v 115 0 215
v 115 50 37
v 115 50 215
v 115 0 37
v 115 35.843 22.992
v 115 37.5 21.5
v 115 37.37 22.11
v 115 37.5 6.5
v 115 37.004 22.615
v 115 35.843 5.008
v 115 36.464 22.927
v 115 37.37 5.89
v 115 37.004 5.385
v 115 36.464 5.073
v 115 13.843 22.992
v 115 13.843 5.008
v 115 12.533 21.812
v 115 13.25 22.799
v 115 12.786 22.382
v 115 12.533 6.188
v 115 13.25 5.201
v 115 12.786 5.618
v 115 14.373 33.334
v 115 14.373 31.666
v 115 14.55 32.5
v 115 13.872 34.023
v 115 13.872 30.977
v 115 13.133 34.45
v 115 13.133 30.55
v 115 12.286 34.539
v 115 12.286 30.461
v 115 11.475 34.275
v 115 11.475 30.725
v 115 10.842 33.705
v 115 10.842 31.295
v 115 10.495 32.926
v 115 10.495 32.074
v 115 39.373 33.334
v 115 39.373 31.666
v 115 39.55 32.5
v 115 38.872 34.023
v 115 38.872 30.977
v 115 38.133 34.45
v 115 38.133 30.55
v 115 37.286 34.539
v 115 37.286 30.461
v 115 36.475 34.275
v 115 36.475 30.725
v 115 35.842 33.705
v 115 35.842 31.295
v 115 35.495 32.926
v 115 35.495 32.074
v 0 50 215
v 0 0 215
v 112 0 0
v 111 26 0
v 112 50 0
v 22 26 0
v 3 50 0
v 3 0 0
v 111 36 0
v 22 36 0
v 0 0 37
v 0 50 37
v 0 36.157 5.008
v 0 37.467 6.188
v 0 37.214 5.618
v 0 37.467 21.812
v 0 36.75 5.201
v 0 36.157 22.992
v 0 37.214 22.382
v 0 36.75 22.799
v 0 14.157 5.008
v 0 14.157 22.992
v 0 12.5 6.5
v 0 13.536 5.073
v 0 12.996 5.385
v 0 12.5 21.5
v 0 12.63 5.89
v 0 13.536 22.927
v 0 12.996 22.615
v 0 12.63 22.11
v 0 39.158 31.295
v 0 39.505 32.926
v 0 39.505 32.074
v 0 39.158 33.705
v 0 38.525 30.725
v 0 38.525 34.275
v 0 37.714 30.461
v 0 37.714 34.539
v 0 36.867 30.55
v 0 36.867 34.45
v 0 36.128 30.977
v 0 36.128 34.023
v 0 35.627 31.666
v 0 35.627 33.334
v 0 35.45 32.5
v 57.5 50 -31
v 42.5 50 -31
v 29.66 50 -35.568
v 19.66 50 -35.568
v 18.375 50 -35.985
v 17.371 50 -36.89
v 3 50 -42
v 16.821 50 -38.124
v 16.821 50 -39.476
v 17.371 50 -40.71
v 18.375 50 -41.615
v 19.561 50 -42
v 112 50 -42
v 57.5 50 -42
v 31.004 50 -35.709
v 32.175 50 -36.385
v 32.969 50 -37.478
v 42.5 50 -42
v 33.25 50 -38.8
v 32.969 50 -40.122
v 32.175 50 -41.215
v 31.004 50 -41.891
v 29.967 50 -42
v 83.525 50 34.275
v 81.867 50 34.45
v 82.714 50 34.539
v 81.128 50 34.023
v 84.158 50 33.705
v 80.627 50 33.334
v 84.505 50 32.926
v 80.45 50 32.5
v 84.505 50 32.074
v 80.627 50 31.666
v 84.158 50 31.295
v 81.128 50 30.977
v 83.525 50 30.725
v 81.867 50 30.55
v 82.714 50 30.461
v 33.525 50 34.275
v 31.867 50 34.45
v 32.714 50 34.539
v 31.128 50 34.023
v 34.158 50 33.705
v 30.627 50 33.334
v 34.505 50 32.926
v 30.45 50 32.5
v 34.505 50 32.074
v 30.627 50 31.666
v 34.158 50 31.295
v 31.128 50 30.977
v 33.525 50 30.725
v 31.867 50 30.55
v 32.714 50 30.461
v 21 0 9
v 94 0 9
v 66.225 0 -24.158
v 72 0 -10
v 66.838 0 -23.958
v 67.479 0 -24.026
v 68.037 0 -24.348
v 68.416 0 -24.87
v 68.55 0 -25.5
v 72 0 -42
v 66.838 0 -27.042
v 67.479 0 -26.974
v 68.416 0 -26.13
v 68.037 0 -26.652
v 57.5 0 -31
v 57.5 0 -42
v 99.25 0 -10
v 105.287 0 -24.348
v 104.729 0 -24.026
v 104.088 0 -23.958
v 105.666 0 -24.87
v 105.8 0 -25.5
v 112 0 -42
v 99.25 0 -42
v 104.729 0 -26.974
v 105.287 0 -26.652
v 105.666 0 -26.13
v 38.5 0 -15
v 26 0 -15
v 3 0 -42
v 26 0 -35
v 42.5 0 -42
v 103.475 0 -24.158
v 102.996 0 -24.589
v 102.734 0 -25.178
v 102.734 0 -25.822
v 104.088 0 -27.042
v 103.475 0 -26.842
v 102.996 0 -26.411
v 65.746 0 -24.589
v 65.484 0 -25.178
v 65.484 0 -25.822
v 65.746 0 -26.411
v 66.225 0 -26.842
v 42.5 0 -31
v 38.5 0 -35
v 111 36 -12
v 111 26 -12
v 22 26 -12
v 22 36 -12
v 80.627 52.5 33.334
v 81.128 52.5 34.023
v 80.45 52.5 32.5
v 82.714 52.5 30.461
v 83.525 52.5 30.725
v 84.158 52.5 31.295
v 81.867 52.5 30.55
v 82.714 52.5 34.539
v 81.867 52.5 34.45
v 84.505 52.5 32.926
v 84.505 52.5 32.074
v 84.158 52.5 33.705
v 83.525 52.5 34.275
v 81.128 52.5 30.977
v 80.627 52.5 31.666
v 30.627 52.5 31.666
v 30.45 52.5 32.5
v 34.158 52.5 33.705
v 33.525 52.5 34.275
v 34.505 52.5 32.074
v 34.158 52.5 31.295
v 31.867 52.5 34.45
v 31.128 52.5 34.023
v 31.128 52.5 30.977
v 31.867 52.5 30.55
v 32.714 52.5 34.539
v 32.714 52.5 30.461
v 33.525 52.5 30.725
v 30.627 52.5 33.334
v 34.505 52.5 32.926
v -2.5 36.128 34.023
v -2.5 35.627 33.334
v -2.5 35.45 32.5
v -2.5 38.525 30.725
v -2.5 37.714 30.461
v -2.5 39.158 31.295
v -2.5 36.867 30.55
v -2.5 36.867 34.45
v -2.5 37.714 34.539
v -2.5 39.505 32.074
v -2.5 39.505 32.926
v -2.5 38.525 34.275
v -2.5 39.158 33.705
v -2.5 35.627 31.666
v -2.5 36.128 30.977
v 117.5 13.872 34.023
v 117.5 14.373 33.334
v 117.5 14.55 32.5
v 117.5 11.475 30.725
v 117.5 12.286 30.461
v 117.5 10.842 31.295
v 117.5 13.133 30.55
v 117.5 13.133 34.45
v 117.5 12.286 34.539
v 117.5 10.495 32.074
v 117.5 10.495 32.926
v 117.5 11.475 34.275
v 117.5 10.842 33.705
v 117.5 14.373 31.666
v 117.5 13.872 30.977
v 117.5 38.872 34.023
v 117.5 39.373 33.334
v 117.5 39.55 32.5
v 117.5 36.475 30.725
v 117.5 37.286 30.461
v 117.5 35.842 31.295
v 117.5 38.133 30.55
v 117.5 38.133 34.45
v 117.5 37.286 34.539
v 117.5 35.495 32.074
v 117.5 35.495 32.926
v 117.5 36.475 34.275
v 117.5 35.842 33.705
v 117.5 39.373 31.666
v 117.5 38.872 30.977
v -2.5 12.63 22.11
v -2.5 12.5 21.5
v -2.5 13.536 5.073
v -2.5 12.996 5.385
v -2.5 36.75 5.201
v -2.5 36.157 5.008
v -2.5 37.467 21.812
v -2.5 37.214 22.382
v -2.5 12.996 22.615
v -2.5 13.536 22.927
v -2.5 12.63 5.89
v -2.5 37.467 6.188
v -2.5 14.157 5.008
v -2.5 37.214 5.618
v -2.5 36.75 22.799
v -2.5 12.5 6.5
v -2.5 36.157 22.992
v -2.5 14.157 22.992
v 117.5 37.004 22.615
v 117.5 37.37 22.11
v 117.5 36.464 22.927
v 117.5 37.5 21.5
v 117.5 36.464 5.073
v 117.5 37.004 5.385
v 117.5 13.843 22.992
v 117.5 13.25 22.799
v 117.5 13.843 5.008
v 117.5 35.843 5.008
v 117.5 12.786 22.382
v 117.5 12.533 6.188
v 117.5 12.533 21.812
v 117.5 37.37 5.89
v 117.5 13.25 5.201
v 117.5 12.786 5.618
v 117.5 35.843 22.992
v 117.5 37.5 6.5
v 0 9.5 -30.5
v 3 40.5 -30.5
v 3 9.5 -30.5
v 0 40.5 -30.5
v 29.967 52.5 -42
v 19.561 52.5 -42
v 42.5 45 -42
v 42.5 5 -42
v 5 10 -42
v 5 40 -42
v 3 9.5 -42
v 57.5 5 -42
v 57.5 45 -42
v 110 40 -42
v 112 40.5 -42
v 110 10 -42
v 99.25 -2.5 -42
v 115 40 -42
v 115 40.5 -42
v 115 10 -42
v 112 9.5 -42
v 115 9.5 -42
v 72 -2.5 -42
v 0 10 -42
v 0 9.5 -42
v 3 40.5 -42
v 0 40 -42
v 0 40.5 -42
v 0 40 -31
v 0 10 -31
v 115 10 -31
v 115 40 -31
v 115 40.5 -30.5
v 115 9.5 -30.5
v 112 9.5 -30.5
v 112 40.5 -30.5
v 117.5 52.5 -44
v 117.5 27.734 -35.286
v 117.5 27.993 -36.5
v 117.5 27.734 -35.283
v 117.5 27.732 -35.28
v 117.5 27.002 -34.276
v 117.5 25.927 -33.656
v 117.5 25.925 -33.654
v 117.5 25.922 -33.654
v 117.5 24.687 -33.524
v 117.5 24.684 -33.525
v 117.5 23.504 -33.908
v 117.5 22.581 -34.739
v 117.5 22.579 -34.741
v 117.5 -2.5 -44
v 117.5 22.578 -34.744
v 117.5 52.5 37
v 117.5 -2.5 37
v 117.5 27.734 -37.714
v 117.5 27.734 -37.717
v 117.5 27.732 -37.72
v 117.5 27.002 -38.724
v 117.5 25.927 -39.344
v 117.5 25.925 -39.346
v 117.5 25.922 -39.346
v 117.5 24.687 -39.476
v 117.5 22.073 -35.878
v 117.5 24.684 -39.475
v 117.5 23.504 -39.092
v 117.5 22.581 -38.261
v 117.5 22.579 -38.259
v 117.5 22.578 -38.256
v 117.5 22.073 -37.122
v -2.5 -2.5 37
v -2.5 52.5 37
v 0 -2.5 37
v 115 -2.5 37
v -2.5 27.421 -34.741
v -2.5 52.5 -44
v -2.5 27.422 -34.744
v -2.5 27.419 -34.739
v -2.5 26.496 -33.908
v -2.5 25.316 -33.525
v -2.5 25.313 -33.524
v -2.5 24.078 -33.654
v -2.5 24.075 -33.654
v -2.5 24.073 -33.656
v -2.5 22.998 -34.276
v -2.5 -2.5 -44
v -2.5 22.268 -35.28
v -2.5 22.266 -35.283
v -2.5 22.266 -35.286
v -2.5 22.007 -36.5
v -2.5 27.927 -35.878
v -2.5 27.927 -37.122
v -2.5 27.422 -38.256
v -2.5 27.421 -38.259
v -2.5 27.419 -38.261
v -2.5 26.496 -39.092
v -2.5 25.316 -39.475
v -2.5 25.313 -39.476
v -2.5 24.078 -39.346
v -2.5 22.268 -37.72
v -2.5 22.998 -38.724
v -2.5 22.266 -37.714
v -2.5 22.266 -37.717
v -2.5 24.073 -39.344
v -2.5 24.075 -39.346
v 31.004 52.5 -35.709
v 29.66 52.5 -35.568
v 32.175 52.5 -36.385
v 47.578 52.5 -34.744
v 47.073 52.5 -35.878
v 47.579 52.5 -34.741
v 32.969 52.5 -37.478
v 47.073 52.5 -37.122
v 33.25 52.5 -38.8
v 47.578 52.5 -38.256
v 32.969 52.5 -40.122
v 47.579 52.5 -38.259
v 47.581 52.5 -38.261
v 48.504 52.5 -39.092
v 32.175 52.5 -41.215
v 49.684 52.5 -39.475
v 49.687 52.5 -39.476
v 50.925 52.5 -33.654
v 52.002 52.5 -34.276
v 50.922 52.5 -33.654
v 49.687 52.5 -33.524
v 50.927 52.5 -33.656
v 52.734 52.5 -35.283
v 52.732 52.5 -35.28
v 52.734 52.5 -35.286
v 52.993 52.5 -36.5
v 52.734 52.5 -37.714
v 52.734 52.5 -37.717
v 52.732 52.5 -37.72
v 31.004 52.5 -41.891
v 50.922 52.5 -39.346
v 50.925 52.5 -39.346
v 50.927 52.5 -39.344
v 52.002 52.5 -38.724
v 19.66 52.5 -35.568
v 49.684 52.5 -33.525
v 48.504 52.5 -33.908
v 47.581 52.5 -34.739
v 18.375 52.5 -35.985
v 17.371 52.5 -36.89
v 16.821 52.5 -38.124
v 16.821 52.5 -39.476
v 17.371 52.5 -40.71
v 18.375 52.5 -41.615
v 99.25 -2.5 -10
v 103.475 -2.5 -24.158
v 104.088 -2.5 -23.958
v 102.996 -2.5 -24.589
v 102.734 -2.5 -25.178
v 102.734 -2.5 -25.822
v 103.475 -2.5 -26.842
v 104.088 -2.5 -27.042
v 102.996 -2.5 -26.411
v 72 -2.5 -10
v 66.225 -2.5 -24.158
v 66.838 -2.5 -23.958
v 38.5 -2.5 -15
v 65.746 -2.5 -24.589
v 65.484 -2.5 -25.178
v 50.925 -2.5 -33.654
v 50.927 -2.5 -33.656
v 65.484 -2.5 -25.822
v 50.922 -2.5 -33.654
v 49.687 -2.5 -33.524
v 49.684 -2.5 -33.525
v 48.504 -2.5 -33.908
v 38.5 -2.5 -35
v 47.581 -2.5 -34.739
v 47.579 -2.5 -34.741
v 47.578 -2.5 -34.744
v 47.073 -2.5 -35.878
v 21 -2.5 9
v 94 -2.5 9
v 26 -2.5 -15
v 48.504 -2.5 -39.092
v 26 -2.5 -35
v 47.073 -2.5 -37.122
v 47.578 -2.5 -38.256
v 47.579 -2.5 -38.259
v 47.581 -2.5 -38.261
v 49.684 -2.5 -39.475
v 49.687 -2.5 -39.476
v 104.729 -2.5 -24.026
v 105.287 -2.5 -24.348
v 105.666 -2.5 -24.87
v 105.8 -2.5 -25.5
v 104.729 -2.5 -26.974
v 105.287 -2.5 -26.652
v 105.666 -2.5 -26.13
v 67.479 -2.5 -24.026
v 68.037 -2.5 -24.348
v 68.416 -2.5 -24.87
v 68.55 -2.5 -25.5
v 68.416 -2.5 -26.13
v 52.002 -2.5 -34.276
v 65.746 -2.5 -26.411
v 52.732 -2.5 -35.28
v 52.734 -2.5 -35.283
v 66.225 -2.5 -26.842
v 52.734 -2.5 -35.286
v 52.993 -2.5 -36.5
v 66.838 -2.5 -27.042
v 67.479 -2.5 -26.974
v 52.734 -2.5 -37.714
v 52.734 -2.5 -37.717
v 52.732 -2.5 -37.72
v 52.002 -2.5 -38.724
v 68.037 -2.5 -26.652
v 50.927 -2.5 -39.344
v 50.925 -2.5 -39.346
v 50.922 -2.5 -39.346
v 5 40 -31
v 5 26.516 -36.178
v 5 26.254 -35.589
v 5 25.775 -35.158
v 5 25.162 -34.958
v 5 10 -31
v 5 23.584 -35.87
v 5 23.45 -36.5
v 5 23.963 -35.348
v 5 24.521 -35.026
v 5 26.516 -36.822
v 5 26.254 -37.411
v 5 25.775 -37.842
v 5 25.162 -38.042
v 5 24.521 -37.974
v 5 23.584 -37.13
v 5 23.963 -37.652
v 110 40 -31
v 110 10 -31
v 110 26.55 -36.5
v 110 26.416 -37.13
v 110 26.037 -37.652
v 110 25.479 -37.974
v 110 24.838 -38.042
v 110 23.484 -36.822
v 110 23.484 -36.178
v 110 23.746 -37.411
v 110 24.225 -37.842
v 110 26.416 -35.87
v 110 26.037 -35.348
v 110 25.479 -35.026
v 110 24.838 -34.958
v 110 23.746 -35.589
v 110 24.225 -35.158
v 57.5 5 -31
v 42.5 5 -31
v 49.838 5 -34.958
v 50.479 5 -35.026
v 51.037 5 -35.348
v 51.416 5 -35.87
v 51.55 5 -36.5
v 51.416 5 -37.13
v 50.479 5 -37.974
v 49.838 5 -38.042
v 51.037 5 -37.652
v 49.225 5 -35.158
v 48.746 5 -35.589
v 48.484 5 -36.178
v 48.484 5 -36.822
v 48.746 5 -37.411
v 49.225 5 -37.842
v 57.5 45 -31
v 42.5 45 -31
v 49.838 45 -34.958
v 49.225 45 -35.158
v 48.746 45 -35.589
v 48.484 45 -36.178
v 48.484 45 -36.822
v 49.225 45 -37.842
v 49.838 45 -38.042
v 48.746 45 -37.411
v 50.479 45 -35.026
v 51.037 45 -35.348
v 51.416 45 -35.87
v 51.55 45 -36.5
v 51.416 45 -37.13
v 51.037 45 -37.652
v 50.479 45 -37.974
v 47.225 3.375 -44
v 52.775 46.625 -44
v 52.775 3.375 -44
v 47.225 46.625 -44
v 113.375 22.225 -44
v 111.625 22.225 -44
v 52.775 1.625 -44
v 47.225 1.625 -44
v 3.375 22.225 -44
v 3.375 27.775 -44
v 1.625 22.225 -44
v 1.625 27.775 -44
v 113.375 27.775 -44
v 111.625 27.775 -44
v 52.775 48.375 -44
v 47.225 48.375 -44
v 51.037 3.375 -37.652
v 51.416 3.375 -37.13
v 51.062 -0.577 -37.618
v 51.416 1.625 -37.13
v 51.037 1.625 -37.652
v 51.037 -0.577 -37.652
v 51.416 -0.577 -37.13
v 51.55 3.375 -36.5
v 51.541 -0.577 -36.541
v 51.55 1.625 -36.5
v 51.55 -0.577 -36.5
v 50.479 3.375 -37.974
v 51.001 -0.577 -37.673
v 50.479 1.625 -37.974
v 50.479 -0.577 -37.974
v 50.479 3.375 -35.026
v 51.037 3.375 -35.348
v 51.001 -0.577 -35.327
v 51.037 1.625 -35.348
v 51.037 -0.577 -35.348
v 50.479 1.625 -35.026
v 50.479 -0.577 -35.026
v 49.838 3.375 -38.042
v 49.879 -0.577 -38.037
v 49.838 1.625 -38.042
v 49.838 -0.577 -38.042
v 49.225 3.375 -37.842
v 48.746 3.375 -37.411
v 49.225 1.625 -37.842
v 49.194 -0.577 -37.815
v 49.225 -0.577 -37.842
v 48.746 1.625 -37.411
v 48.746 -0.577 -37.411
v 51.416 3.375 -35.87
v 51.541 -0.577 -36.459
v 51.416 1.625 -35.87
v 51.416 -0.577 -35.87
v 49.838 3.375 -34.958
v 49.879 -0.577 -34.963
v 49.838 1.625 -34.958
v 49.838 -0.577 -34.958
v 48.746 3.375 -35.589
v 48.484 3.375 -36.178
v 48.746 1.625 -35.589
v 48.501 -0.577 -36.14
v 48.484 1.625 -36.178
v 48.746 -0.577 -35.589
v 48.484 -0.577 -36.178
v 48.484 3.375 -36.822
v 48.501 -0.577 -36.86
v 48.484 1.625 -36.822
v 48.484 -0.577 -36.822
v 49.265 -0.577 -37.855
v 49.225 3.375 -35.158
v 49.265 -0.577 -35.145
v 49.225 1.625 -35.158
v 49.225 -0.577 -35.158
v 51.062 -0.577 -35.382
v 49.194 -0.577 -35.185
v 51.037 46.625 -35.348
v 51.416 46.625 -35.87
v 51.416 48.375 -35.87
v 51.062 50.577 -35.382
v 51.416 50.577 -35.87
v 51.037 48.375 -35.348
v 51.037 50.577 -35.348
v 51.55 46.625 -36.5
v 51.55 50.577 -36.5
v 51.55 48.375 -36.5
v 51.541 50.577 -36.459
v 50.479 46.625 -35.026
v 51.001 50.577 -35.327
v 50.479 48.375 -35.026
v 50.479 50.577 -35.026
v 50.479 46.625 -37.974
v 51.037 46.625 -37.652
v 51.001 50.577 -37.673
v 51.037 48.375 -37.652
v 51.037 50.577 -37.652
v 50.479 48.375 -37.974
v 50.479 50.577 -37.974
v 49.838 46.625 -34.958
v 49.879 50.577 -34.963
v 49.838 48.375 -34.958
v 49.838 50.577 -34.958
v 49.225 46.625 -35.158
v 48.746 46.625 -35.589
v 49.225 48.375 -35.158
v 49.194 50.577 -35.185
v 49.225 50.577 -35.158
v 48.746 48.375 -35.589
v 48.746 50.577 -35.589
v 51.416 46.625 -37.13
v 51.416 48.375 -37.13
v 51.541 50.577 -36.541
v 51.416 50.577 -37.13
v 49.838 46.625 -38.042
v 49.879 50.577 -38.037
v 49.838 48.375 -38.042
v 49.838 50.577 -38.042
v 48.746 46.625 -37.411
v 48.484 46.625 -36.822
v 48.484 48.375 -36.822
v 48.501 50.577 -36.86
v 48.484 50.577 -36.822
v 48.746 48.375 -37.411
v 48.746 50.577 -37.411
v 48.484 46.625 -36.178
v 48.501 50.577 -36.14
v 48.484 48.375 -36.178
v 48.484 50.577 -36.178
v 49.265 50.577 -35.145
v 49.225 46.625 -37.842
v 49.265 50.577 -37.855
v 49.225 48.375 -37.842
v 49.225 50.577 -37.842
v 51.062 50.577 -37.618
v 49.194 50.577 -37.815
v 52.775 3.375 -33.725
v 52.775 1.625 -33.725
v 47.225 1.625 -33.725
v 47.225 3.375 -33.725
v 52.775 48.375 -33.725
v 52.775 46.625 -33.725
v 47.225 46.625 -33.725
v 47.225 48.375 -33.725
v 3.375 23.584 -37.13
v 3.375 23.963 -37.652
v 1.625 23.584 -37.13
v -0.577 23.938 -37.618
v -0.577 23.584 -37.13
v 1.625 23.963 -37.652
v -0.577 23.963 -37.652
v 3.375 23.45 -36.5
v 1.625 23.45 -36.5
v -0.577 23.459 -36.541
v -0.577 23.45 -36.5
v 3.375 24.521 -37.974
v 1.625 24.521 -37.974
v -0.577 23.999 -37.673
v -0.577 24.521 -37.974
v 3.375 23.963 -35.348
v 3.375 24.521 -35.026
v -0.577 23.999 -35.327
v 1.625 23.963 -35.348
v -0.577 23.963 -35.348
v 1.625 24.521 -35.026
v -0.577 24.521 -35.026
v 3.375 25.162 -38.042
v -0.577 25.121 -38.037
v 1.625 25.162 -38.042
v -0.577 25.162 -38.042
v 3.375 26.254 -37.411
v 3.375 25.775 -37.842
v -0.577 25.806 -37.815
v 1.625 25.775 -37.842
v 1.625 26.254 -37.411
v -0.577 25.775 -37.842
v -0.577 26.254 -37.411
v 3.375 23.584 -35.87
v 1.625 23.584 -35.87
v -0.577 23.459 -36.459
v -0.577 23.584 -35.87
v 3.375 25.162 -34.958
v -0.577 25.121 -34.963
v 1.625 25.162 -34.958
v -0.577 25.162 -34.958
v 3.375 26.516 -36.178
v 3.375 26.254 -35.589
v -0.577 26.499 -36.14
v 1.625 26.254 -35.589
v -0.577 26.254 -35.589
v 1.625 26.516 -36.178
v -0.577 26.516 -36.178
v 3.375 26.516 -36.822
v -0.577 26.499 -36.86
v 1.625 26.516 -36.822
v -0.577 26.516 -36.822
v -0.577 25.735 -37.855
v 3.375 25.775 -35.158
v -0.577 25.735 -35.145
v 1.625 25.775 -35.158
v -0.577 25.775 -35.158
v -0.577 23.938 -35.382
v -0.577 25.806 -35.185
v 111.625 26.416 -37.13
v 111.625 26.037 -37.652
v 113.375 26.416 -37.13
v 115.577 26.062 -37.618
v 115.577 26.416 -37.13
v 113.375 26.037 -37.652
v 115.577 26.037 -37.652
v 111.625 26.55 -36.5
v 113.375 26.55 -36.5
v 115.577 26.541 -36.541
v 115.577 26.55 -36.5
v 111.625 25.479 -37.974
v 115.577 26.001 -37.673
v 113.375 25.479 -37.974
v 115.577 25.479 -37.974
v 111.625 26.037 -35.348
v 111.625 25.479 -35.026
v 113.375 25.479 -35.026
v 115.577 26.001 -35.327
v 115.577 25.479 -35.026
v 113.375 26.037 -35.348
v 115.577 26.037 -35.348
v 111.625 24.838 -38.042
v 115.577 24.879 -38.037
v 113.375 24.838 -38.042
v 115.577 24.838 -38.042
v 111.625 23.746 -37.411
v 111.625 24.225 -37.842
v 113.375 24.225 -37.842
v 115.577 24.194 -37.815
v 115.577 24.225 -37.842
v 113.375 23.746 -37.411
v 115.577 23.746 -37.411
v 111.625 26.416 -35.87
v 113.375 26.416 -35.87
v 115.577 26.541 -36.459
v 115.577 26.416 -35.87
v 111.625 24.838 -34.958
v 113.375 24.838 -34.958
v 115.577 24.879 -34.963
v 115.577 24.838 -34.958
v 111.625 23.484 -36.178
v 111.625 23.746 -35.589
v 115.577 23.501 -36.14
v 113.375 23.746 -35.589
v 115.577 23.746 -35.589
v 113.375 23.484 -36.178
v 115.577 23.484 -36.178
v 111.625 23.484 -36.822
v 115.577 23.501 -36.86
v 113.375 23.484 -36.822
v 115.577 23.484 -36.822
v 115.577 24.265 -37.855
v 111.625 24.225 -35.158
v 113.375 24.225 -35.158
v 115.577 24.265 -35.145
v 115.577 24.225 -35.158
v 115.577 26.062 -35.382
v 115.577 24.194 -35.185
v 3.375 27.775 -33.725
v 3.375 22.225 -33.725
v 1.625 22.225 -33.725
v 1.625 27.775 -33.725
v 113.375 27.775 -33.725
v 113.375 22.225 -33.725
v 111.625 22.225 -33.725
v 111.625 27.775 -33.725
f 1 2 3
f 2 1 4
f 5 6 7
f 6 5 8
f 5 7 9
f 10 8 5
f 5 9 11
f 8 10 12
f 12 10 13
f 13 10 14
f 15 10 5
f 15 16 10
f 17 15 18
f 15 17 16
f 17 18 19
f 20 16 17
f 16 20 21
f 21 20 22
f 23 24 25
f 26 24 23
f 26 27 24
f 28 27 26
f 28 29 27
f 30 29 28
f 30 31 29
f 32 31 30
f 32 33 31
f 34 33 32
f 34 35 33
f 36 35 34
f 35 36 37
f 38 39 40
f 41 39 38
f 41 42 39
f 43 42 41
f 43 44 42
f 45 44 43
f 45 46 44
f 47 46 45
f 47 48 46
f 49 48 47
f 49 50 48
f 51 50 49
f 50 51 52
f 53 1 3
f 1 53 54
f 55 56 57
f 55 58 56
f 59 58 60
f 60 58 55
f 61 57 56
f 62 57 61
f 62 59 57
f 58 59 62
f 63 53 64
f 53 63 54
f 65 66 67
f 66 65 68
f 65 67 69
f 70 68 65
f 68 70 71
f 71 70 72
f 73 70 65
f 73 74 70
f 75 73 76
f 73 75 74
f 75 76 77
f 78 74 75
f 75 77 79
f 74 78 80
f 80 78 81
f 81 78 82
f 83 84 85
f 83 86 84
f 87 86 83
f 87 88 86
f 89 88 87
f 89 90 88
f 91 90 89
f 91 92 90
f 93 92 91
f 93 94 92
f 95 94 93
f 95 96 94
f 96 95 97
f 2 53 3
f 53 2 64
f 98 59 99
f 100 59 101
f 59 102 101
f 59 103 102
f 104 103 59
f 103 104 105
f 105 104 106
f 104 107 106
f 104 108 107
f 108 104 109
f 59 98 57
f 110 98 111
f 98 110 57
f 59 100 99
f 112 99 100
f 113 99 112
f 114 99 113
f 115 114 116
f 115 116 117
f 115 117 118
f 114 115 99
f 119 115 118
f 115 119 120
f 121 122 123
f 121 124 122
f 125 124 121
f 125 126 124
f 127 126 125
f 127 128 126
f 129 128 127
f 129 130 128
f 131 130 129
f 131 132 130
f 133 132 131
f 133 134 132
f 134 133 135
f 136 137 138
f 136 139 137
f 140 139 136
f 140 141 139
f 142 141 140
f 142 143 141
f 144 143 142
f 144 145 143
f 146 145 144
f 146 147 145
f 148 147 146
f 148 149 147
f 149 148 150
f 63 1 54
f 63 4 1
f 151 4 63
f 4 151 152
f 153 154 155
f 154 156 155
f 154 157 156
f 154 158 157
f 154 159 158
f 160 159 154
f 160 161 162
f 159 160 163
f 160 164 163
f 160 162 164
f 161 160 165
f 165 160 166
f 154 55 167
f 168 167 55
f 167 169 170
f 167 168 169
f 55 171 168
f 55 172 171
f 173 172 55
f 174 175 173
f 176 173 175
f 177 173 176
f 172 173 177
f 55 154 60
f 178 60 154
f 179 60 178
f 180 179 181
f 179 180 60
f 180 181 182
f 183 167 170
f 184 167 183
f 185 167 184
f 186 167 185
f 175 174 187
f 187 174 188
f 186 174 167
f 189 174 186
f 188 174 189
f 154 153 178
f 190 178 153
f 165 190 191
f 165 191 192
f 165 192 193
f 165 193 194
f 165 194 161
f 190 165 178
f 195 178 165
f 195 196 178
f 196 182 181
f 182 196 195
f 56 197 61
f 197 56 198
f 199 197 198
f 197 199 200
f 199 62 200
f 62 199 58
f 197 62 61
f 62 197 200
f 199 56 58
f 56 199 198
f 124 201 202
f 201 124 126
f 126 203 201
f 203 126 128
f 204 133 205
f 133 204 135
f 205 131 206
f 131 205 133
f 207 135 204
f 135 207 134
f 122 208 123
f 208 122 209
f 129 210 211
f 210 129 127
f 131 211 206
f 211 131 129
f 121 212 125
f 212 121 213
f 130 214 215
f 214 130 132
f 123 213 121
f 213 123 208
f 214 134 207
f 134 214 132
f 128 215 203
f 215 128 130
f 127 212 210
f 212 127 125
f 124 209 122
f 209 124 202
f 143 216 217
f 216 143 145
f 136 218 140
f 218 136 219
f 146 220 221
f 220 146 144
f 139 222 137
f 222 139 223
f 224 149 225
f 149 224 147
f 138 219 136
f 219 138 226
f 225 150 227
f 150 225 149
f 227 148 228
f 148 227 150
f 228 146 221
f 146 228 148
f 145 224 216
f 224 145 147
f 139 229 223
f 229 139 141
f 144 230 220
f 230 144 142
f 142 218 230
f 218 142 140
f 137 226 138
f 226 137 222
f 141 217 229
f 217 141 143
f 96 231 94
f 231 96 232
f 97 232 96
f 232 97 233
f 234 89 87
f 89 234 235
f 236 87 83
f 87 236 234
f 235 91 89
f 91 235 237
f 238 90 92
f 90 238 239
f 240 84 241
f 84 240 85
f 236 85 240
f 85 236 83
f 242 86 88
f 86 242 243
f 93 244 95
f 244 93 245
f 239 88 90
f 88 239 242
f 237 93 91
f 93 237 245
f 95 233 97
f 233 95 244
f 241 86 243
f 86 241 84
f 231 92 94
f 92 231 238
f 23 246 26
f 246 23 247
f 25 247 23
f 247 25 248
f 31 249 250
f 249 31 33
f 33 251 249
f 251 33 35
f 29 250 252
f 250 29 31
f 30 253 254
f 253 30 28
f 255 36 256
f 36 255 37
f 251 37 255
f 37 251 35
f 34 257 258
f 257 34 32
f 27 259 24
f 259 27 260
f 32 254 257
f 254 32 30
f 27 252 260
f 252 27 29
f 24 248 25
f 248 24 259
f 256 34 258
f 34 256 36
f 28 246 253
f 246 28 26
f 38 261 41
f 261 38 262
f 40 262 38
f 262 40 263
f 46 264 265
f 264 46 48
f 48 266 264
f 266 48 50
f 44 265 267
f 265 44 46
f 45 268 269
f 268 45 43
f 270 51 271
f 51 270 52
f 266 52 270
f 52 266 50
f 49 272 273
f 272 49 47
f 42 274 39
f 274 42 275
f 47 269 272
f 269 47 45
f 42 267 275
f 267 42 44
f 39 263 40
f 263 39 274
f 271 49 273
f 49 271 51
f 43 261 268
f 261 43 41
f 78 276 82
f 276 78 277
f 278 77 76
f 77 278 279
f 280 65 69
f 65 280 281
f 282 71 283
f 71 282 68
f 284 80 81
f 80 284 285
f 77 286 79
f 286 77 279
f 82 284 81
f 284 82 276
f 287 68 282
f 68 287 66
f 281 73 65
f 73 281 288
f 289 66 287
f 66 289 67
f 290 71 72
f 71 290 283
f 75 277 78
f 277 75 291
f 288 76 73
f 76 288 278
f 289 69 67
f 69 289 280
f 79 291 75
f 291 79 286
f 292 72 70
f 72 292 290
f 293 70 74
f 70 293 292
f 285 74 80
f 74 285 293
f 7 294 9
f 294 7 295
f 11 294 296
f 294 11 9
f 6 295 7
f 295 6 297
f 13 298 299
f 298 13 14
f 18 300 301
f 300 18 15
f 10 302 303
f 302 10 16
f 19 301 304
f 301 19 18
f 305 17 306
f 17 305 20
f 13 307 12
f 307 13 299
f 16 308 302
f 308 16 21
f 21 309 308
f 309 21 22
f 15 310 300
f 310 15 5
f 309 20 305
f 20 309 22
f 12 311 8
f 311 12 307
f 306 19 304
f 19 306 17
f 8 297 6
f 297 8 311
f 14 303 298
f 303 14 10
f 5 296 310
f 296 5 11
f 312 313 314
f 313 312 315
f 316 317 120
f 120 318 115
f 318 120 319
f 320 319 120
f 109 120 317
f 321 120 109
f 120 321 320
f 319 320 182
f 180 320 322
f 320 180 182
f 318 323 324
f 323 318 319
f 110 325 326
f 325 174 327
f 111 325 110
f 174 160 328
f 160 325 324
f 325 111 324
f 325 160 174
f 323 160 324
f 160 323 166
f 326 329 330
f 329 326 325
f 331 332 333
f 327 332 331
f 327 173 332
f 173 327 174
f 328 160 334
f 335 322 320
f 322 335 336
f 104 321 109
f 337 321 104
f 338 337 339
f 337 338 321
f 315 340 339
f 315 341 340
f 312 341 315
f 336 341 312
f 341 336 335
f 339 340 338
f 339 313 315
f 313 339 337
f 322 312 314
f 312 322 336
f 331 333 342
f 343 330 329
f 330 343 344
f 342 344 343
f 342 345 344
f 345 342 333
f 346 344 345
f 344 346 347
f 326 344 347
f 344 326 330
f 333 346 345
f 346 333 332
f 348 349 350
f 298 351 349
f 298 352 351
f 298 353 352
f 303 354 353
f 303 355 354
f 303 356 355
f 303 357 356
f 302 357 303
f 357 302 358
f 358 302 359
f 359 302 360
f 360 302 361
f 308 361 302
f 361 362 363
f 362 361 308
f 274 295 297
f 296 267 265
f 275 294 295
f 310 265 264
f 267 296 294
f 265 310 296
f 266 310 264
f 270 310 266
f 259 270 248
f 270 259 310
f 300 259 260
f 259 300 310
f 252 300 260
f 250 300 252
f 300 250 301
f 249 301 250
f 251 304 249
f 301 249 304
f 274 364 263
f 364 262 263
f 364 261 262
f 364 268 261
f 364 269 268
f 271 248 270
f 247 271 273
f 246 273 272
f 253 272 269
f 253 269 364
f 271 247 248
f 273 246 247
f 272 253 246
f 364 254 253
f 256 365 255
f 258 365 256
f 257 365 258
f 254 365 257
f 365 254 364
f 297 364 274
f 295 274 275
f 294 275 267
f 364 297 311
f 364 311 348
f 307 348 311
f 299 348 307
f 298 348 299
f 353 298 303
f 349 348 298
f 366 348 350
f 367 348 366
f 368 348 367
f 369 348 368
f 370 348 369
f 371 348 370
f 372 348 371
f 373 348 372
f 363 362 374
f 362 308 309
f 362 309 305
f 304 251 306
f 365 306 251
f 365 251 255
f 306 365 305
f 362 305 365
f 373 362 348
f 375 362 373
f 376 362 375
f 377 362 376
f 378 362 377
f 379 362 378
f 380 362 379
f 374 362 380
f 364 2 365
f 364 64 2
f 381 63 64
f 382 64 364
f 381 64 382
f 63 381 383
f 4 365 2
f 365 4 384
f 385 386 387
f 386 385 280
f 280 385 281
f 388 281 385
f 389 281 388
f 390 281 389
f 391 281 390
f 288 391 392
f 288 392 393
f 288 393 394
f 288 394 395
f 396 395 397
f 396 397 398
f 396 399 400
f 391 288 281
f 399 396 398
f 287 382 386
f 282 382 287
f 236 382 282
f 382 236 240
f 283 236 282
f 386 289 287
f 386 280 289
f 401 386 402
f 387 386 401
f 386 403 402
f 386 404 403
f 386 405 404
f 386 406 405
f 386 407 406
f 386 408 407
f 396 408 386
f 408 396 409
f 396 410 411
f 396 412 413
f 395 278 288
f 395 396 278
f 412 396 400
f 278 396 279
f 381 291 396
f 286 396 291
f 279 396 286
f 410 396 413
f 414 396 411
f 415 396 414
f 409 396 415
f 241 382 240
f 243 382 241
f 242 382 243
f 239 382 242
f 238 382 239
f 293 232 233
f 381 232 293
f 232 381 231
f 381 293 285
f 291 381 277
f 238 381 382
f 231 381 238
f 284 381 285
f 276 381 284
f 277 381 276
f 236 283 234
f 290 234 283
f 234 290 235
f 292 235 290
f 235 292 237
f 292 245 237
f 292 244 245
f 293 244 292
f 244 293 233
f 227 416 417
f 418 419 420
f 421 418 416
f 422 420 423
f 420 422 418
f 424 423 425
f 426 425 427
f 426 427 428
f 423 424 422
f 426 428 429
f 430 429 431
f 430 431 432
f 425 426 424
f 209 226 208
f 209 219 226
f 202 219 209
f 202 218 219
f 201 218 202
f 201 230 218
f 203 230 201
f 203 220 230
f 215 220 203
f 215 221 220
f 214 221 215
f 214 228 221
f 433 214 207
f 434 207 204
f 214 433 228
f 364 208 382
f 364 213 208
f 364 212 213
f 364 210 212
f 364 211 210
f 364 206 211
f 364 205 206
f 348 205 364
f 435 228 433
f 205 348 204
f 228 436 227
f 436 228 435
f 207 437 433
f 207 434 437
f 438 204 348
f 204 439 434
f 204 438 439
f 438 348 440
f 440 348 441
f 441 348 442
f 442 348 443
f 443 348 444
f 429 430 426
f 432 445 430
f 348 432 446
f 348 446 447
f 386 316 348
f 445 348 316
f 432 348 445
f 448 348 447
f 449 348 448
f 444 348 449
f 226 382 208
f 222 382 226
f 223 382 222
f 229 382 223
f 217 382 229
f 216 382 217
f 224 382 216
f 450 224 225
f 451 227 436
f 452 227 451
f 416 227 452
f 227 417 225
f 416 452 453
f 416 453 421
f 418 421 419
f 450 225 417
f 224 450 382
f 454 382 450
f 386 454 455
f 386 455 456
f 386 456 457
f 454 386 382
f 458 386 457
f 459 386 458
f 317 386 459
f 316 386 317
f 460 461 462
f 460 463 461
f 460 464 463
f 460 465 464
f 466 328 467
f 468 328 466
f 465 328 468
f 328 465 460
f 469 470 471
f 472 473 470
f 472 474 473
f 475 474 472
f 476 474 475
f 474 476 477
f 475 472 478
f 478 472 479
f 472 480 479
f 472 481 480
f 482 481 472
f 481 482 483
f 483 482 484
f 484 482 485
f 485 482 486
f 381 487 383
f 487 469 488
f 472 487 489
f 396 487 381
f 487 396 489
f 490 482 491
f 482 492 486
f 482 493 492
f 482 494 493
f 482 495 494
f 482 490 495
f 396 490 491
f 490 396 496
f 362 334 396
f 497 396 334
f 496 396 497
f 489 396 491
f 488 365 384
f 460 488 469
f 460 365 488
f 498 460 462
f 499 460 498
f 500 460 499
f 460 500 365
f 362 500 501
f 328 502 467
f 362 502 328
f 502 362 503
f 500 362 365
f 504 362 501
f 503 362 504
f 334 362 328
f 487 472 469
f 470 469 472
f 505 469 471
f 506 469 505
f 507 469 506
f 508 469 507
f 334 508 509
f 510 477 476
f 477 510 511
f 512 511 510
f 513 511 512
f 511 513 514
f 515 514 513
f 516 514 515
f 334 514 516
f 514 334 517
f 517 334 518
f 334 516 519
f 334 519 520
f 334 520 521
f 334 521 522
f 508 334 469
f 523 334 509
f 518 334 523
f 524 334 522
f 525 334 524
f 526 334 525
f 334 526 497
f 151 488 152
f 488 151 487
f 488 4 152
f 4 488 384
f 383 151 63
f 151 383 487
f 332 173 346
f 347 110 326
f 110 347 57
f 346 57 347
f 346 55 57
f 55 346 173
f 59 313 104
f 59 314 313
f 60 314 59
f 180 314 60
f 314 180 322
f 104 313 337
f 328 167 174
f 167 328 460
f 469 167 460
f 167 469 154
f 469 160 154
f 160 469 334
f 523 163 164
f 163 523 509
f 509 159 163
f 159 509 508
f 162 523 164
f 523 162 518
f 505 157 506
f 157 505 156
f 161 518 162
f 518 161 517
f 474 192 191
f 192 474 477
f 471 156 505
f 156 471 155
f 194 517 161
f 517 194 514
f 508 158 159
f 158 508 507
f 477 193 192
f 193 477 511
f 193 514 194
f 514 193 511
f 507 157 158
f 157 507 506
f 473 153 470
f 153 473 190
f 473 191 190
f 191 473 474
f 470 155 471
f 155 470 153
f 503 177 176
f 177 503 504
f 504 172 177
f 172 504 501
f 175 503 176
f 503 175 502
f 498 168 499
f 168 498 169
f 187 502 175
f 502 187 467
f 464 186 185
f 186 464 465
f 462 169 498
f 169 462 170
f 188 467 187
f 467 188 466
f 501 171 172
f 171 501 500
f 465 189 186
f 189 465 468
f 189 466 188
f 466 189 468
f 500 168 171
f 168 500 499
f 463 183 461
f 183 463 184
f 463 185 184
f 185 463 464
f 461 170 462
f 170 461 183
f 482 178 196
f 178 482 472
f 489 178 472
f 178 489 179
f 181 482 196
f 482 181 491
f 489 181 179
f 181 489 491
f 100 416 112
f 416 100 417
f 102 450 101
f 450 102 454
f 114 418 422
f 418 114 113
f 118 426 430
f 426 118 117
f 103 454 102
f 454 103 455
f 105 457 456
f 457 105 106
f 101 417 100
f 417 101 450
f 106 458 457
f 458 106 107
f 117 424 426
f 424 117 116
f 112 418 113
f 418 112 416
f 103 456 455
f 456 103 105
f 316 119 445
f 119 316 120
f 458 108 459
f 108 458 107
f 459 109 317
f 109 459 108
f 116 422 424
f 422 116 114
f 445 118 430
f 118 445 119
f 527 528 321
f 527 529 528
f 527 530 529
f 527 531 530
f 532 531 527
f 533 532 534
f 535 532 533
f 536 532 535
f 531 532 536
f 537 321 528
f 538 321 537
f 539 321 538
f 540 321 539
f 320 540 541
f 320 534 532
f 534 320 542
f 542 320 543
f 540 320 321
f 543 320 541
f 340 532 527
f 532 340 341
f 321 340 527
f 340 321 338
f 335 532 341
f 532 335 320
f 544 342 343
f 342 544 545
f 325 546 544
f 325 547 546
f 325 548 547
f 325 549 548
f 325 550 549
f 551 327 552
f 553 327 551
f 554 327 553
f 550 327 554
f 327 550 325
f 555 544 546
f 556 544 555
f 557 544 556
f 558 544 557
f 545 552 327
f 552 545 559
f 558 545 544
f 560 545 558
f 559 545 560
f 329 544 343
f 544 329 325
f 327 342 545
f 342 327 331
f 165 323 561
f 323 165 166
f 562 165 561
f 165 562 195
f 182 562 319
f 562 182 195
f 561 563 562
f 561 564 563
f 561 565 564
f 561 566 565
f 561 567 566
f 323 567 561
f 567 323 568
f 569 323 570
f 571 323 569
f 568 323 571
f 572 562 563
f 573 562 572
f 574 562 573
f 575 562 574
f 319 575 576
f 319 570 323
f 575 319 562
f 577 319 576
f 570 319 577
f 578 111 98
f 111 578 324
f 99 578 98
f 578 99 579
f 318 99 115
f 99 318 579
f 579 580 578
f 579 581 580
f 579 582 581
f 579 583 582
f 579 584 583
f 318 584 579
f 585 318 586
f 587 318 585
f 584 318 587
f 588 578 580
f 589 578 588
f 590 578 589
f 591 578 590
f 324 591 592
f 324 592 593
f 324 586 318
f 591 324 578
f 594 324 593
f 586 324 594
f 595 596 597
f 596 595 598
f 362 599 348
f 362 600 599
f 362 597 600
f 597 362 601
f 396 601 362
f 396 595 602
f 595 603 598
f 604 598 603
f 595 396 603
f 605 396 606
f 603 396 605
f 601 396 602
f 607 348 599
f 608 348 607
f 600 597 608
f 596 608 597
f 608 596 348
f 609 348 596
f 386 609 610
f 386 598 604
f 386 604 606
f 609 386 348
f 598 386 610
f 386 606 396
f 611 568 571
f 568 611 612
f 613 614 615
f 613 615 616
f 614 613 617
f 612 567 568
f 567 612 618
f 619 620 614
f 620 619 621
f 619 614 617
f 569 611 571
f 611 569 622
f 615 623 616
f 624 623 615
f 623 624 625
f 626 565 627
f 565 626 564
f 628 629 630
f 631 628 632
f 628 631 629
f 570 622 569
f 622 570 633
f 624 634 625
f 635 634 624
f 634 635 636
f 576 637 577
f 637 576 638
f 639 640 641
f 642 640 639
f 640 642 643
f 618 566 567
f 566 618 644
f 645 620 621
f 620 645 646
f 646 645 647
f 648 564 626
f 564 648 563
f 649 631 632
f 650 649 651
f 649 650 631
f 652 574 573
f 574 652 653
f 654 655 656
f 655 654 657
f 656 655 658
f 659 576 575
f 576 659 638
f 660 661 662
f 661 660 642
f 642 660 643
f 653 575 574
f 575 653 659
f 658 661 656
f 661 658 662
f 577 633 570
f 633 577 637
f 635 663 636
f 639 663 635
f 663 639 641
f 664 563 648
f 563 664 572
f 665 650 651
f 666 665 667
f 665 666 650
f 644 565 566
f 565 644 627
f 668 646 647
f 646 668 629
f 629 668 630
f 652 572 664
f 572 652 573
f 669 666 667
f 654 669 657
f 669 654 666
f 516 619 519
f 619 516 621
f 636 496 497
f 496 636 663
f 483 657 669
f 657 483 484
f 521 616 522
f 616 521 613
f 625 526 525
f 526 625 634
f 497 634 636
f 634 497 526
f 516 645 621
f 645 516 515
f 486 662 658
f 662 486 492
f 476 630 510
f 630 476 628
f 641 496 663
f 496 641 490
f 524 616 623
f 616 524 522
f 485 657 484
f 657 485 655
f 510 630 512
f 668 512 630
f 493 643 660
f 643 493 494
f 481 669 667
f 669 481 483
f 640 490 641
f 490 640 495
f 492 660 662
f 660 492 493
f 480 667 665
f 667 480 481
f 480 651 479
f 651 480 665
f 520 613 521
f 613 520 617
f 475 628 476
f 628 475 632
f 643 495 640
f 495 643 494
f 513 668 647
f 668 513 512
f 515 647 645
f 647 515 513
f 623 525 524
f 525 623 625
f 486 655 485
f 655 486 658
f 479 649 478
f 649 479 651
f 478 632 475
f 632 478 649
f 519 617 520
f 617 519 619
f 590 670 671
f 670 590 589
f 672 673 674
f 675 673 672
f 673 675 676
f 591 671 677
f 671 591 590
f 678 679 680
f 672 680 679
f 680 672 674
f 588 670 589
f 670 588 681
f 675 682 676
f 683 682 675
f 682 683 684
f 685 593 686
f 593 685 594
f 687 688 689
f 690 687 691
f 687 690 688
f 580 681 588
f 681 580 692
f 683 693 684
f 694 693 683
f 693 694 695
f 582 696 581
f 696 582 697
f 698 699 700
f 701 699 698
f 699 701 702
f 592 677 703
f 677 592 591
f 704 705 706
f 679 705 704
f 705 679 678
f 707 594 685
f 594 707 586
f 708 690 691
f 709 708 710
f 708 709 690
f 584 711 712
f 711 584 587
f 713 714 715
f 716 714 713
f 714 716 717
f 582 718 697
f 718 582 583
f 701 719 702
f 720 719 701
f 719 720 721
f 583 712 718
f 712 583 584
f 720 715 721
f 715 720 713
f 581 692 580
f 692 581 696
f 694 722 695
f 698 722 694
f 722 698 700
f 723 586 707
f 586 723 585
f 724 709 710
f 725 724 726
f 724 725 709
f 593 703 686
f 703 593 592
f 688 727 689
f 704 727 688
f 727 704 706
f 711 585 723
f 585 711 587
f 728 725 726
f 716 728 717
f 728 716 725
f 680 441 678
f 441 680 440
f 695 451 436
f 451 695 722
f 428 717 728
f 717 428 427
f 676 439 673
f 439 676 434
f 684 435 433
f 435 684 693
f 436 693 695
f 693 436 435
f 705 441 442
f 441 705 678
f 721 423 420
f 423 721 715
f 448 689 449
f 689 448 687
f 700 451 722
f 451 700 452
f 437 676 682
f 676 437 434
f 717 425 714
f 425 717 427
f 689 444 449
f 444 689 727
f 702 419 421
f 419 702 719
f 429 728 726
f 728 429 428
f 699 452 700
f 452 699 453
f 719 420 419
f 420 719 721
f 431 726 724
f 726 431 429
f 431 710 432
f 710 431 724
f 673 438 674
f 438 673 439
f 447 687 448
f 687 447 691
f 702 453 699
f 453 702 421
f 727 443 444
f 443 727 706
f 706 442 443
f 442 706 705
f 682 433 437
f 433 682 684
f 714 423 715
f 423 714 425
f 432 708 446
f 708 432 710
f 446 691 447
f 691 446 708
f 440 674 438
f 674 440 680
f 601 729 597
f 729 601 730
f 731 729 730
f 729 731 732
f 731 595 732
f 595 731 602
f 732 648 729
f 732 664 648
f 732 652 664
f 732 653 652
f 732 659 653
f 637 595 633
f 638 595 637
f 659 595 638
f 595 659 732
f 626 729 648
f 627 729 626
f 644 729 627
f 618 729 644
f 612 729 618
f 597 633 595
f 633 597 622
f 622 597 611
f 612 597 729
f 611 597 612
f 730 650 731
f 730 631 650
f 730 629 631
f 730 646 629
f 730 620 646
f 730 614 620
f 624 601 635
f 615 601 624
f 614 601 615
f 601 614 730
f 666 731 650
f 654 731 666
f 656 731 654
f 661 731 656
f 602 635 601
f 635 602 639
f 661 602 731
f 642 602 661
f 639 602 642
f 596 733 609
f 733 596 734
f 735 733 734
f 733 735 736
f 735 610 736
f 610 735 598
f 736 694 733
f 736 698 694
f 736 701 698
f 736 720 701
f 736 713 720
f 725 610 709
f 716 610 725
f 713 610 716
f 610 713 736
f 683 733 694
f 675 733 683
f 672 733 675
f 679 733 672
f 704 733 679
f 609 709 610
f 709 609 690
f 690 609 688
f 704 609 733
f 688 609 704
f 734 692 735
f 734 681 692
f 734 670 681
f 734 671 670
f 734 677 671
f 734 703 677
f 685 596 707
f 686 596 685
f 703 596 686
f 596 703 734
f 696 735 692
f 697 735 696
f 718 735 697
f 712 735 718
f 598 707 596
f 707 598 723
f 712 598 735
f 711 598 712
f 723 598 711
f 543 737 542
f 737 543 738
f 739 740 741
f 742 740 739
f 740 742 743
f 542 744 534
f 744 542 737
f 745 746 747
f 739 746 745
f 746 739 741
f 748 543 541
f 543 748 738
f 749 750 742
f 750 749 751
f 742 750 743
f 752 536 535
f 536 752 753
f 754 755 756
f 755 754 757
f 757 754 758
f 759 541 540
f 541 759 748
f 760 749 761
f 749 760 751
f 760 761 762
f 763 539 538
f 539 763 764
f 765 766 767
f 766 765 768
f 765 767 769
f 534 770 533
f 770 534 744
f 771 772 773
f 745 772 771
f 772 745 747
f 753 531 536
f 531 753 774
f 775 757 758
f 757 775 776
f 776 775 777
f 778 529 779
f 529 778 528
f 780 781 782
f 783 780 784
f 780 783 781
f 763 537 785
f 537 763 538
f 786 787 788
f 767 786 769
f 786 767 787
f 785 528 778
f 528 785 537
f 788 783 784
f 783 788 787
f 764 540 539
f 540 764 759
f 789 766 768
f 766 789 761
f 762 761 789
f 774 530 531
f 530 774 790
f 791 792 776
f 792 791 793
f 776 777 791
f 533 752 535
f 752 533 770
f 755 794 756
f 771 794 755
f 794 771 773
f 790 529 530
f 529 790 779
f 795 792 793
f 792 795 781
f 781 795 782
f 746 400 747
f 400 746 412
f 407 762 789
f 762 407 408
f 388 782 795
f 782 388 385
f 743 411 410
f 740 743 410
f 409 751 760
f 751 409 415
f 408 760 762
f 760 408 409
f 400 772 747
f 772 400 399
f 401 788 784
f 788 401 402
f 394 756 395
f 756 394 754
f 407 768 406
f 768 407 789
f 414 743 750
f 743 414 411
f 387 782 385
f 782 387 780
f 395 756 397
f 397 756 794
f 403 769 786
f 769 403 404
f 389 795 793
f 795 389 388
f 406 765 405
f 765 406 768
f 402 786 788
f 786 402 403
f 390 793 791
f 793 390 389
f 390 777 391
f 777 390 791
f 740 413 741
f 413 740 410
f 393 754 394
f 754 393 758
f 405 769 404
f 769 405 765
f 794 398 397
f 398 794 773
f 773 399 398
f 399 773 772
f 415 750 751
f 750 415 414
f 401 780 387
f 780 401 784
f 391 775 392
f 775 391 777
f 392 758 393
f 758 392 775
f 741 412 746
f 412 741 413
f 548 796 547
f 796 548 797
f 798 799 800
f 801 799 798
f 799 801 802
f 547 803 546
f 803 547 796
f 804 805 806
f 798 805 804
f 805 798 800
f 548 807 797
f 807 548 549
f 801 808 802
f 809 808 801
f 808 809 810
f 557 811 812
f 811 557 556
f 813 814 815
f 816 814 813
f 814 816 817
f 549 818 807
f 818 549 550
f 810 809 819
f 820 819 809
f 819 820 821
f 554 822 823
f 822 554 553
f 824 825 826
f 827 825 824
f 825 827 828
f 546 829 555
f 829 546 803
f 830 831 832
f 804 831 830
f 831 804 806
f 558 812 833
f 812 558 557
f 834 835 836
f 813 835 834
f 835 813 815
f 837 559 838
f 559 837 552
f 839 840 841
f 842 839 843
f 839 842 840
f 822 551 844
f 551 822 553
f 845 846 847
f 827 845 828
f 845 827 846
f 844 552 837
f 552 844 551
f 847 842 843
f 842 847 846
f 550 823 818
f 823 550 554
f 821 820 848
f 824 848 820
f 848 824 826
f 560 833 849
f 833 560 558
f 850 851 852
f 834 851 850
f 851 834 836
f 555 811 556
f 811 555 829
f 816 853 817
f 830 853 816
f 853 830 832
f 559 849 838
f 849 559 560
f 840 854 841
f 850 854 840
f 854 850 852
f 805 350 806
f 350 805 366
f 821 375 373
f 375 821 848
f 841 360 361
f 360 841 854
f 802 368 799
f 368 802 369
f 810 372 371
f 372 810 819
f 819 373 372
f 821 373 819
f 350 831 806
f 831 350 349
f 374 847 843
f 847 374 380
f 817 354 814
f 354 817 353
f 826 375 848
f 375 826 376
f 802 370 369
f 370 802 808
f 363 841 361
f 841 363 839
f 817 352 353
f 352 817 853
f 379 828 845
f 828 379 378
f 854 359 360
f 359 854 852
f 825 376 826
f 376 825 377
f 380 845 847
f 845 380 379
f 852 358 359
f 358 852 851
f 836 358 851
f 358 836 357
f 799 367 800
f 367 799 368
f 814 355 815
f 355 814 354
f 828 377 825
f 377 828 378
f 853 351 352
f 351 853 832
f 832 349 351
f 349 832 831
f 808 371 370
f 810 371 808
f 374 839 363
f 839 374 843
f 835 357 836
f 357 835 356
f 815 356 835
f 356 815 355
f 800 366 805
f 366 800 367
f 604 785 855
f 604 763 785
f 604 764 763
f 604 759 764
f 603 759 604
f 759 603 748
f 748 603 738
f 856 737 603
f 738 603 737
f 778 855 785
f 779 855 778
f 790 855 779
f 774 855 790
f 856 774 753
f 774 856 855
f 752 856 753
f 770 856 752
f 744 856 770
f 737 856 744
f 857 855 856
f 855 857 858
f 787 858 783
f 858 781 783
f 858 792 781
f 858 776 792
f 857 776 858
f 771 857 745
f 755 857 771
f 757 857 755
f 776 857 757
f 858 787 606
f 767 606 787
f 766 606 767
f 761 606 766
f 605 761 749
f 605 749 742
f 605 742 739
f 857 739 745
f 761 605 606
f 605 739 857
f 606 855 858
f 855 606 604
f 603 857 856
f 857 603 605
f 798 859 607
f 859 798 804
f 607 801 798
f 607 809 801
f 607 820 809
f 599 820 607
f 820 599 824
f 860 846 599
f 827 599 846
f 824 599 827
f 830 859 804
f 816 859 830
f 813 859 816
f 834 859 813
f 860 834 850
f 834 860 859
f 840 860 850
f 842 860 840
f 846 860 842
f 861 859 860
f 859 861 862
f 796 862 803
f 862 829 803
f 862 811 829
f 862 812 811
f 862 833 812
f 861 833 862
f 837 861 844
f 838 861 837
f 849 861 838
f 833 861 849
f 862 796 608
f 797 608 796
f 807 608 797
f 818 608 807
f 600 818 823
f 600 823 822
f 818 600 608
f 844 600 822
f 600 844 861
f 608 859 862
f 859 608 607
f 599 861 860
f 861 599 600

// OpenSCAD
/*
Cover for the Mean Well NES-350 power supplies
https://www.thingiverse.com/thing:2814343/

2018-03-15

Designed for use with pmeyer's brace/psu mount for the Prusa i3 MK3
  https://www.thingiverse.com/thing:2783871/
but you could use it in your own projects or just stand alone,
assuming you can find the right switch and power inlet. Or edit those out.

Highly recommend a version of OpenSCAD with the customizer. You might have
to enable the feature in prefs and then unhide it from the view menu.

Changelog:
  2018-03-04: Initial release.
  2018-03-15: Corrected square nut slot location. Added cutout for side vents.

*/

/* [Which Object?] */
render_psu = true; // for debugging
render_base = true;
render_bottom = true;
$fn=15;

/* [PSU Measurements] */
psu_length = 215;
psu_width  = 115;
psu_height = 50;
psu_connector_depth = 12; // from spec sheet
psu_connector_width = 89;
psu_connector_inset_from_left = 22;
psu_connector_inset_from_top = 26;
fan_from_top = 47.5; // from spec sheet
fan_from_left = 36.5; // from spec sheet
fan_radius = 30;
face_vent_from_edge = 21; // approx measured
face_vent_width = 26; // approx measured
face_vent_top = 80; // approx measured
side_vent_from_edge = 12.5; // approx from spec sheet
side_vent_bottom = 5; // measured from spec sheet
side_vent_height = 18; // measured from spec sheet, added 1 because it was a bit small once printed
back_holes = [//[10  ,27.5,3], [10  ,  205,3], [105  ,27.5,3], [105,205,3],
              [32.5,32.5,4], [32.5,182.5,4], [ 82.5,32.5,4], [ 82.5,182.5,4]];
left_holes = [[12.5,32.5,4], [12.5, 182.5,4]];
right_holes = [[12.5,32.5,4], [12.5, 182.5,4], [37.5, 32.5, 4], [37.5, 182.5, 4]];
/* [Mount Measurements] */
wall_thickness = 2.5;
wiring_area_height = 30; // matches prusa mount
psu_overlap_rear = 37;
psu_overlap_front = 9;
ledge_thickness_left = 3;
ledge_thickness_right = 3;
inlet_x = 72;
switch_x = 26;
switch_z = 7;

/* [Switch Measurements] */
switch_height = 20;
switch_width = 12.5;

/* [Inlet Measurements] */
inlet_width = 27.25;
inlet_height = 32;
inlet_screw_offset_x = 5;
inlet_screw_offset_z = 16.5;
inlet_screw_dia = 3.1;

/* [Wire Exit] */
wire_exit_width = 10;
wire_exit_height = 6.5;
wire_exit_x = 20;

/* [Base Measurements] */
base_end_tab_length = 30;
base_side_tab_length = 15;
base_tab_thickness = 5;
base_tab_height = 11;
base_side_tab_x = 50;
bottom_thickness = 2;
base_screw_dia = 3.1;

/* [Nuts and Bolts] */
hole_3mm_bolt = 3.1;
hole_3mm_bolt_r = hole_3mm_bolt/2;

// 3mm countersunk dimensions

bolt3_cs_wide_r   = 3;
bolt3_cs_narrow_r = 1.5;
bolt3_cs_height   = 2;

// square 3mm nut for tabs
square_nut3_width  = 5.55;
square_nut3_t       = 1.75;

module hole(v) {
  translate([v[0],v[1],0])
    circle(r=(v[2]+.1)/2);
}

module roundrect(x, y, r=3) {
  translate([r, r]) minkowski() {
    square([x-2*r, y-2*r]);
    circle(r);
  }
}

module psu() {
  color("skyblue")
    cube([psu_width,psu_height,psu_length]);

  // connectors
  color("blue")
    translate([psu_connector_inset_from_left,psu_connector_inset_from_top,-psu_connector_depth])
      cube([psu_connector_width,10, psu_connector_depth]);


  // vents
  color("red") {
    // face
    rotate([90,0,0]) {
      // fan
      translate([fan_from_left, psu_length - fan_from_top, 0]) //xzy
        circle(fan_radius);

      // lower front vents
      translate([face_vent_from_edge, 10,0]) //xzy
        square([face_vent_width, face_vent_top]);
      translate([psu_width - face_vent_from_edge - face_vent_width, 10, 0]) //xzy
        square([face_vent_width, face_vent_top]);

    }
  }

  // holes
  psu_holes();
}

module psu_holes(extrude_l=0) {
  color("purple") {
    // back
    rotate([90,0,180]) translate([-psu_width,0,+psu_height]){
      for(a = back_holes) {
        if(extrude_l > 0) {
          linear_extrude(height=extrude_l) hole(a);
        } else {
          hole(a);
        }
      }
    }

    translate([0,psu_height,0]) rotate([90,0,-90]) {
      for(a = left_holes) {
        if(extrude_l > 0) {
          linear_extrude(height=extrude_l) hole(a);
        } else {
          hole(a);
        }
      }
    }

    translate([psu_width,0,0]) rotate([90,0,90]) {
      for(a = right_holes) {
        if(extrude_l > 0) {
          linear_extrude(height=extrude_l) hole(a);
        } else {
          hole(a);
        }
      }
    }
  }
  color("red") {
    // left
    translate([0,psu_height,0]) rotate([90,0,-90]) {
      translate([side_vent_from_edge, side_vent_bottom, 0]) {
        if(extrude_l > 0) {
          linear_extrude(height=extrude_l) roundrect(x = psu_height - 2*side_vent_from_edge, y = side_vent_height, r=1.5);
        } else {
          roundrect(x = psu_height - 2*side_vent_from_edge, y = side_vent_height, r=1.5);
        }
      }
    }
    // right
    translate([psu_width,0,0]) rotate([90,0,90]) {
      translate([side_vent_from_edge, side_vent_bottom, 0]) {
        if(extrude_l > 0) {
          linear_extrude(height=extrude_l) roundrect(x = psu_height - 2*side_vent_from_edge, y = side_vent_height, r=1.5); //square([psu_height - 2*side_vent_from_edge, side_vent_height]);
        } else {
          roundrect(x = psu_height - 2*side_vent_from_edge, y = side_vent_height, r=1.5); //square([psu_height - 2*side_vent_from_edge, side_vent_height]);
        }
      }
    }
  }
}

module base() {
  difference() {
    translate([-wall_thickness, -wall_thickness, -wiring_area_height-psu_connector_depth])
      cube([psu_width + 2*wall_thickness, psu_height + 2*wall_thickness, wiring_area_height+psu_connector_depth+psu_overlap_rear]);

    translate([0,-wall_thickness-.5,0]) polyhedron(
      points = [
        [face_vent_from_edge,             0,              psu_overlap_front], // 0: bottom front left
        [psu_width - face_vent_from_edge, 0,              psu_overlap_front], // 1: bottom front right
        [psu_width - face_vent_from_edge, wall_thickness+1, psu_overlap_front], // 2: bottom rear right
        [face_vent_from_edge,             wall_thickness+1, psu_overlap_front], // 3: bottom rear left
        [0,                               0,              psu_overlap_rear], // 4: top front left
        [psu_width,                       0,              psu_overlap_rear], // 5: top front right
        [psu_width,                       wall_thickness+1, psu_overlap_rear], // 6: top rear right
        [0,                               wall_thickness+1, psu_overlap_rear]  // 7: top rear left
      ],
      faces = [
        [0,1,2,3],  // bottom
        [4,5,1,0],  // front
        [7,6,5,4],  // top
        [5,6,2,1],  // right
        [6,7,3,2],  // back
        [7,4,0,3] // left
      ]
    );

    cube([psu_width, psu_height, psu_length]);

    translate([ledge_thickness_left, 0, -wiring_area_height-psu_connector_depth-.5])
      cube([psu_width - ledge_thickness_right - ledge_thickness_left, psu_height, wiring_area_height+1+psu_connector_depth]);

    // mount holes
    psu_holes(wall_thickness+1);

    // inlet
    translate([inlet_x, -wall_thickness-.5, -wiring_area_height-psu_connector_depth])
      cube([inlet_width, wall_thickness+1, inlet_height]);
    translate([inlet_x - inlet_screw_offset_x, -wall_thickness-.5, -wiring_area_height-psu_connector_depth+inlet_screw_offset_z])
        rotate([-90,0,0])
          cylinder(r=inlet_screw_dia/2, h=wall_thickness+1);
    translate([inlet_x + inlet_width + inlet_screw_offset_x, -wall_thickness-.5, -wiring_area_height-psu_connector_depth+inlet_screw_offset_z])
        rotate([-90,0,0])
          cylinder(r=inlet_screw_dia/2, h=wall_thickness+1);

    // switch
    translate([switch_x, -wall_thickness-.5, -wiring_area_height-psu_connector_depth+switch_z])
      cube([switch_width, wall_thickness+1, switch_height]);

    // wire exit
    translate([wire_exit_x, psu_height-.5, -wiring_area_height-psu_connector_depth+wire_exit_height/2-.05])
      rotate([-90,0,0])
        hull() {
          cylinder(r=wire_exit_height/2, h=wall_thickness+1);
          translate([wire_exit_width,0,0])
            cylinder(r=wire_exit_height/2, h=wall_thickness+1);
        }

    // bottom tabs
    translate([-wall_thickness, -wall_thickness, -wiring_area_height - bottom_thickness - psu_connector_depth])
    bottom_tabs(play=1);
  }


}

module bottom() {
  translate([-wall_thickness, -wall_thickness, -wiring_area_height - bottom_thickness - psu_connector_depth]) union() {
    cube([psu_width + 2*wall_thickness, psu_height + 2*wall_thickness, bottom_thickness]);

    bottom_tabs();
  }
}

module bolt_hole_3mm(depth, center = false, chamfer = false){
  cylinder(h=depth, r=hole_3mm_bolt_r, centered = center);

  if(chamfer){
    // chamfer on outside edge
    cylinder(h=bolt3_cs_height, r1=bolt3_cs_wide_r, r2=bolt3_cs_narrow_r);
  }
}
module bottom_tabs(play=0) {
  translate([wall_thickness, wall_thickness + (psu_height - base_end_tab_length - play)/2, bottom_thickness])
    cube([base_tab_thickness, base_end_tab_length+play, base_tab_height+play/2]);

  translate([wall_thickness + psu_width - base_tab_thickness, wall_thickness + (psu_height - base_end_tab_length - play)/2, bottom_thickness])
    cube([base_tab_thickness, base_end_tab_length+play, base_tab_height+play/2]);

  translate([wall_thickness + base_side_tab_x - base_side_tab_length/2, wall_thickness, bottom_thickness])
    cube([base_side_tab_length, base_tab_thickness, base_tab_height]);


  translate([wall_thickness + base_side_tab_x - base_side_tab_length/2, wall_thickness + psu_height - base_tab_thickness, bottom_thickness])
    cube([base_side_tab_length, base_tab_thickness, base_tab_height]);
}

module bottom_holes() {
  translate([0, 0, -wiring_area_height - psu_connector_depth + base_tab_height/2]) {
    translate([base_side_tab_x, 0,0]) {
      translate([0,-wall_thickness-.01, 0])
        rotate([-90,0,0])
          bolt_hole_3mm(wall_thickness + base_tab_thickness+.5, chamfer=true);
      translate([-square_nut3_width/2, (base_tab_thickness-square_nut3_t)/2, -.01-bottom_thickness - base_tab_height/2])
        cube([square_nut3_width, square_nut3_t, (base_tab_height + square_nut3_width)/2 + bottom_thickness+.01]);

      translate([0,psu_height+wall_thickness+.01,0]) rotate([90,0,0])
        bolt_hole_3mm(wall_thickness + base_tab_thickness+.5, chamfer=true);
      translate([-square_nut3_width/2,psu_height-(base_tab_thickness+square_nut3_t)/2, -.01-bottom_thickness - base_tab_height/2])
        cube([square_nut3_width, square_nut3_t, (base_tab_height + square_nut3_width)/2 + bottom_thickness+.01]);

    }

    translate([0, psu_height/2,0]) {
      translate([-wall_thickness-.01, 0, 0])
        rotate([-90,0,-90]) bolt_hole_3mm(wall_thickness + base_tab_thickness + .5, chamfer=true);

      translate([(base_tab_thickness - square_nut3_t)/2, -square_nut3_width/2, -.01-bottom_thickness - base_tab_height/2])
        cube([square_nut3_t, square_nut3_width, (base_tab_height + square_nut3_width)/2 + bottom_thickness + .01]);

      translate([psu_width+wall_thickness+.01, 0, 0])
        rotate([-90,0,90]) bolt_hole_3mm(wall_thickness + base_tab_thickness + .5, chamfer=true);

      translate([psu_width -(base_tab_thickness+square_nut3_t)/2, -square_nut3_width/2, -.01-bottom_thickness - base_tab_height/2])
        cube([square_nut3_t, square_nut3_width, (base_tab_height + square_nut3_width)/2 + bottom_thickness + .01]);
    }
  }
}

if(render_psu) psu();
difference() {
  union() {
    if(render_base) color("darkgreen") base();
    if(render_bottom) color("hotpink") bottom();
  }
  bottom_holes();
}
